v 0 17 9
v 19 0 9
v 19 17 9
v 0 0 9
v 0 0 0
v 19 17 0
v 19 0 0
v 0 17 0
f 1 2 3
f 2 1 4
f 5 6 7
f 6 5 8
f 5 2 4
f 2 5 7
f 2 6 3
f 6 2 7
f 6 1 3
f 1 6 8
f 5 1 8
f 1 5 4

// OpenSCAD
// Generated by SolidPython 1.0.1 on 2020-07-29 00:46:56


cube(size = [19, 17, 9]);
/***********************************************
*********      SolidPython code:      **********
************************************************
 
# import packages: SolidPython
from solid import *
from solid.utils import *
from itertools import chain, combinations, permutations


class Resize:

    def __init__(self, scad_file):
        self.scad_file = scad_file
        #self.scad_file = import_scad(scad_file)
        # cone/cylinder param:
        self.r1 = 0
        self.r2 = 0
        self.h = 0
        # rectangular prism param:
        self.w = 0
        self.l = 0
        # ellipse param:
        self.r = 0

    # import OpenScad code (file name corresponds to shape)


    # classify shape + parameters
    def assign(self, param1, param2, param3):
        if self.scad_file == 'cone.scad':
            self.r1 = param1
            self.r2 = param2
            self.h = param3
        elif self.scad_file == 'cylinder.scad':
            self.r1 = param1
            self.r2 = param2
            self.h = param3
        elif self.scad_file == 'rectangularPrism.scad':
            self.h = param1
            self.l = param2
            self.w = param3
        else:
            self.r = param1
            self.h = param2

    # resize parameters
    def iterate(self):
        x = range(3, 20, 2)
        i = 1
        if self.scad_file == 'cone.scad':
            tempList = list(permutations(x, 2))
            for temp in tempList:
                param1 = temp[0]
                param2 = temp[1]
                filepath = 'produced_scad_files/' + 'cone' + str(param1) + '_' + str(param2) + '_' + '.scad'
                scad_render_to_file(cylinder(h=param1, r1=param2, r2=0), filepath)

        elif self.scad_file == 'cylinder.scad':
            tempList = list(permutations(x, 3))
            for temp in tempList:
                param1 = temp[0]
                param2 = temp[1]
                filepath = 'produced_scad_files/' + 'cylinder' + str(param1) + '_' + str(param2) + '_' + '.scad'
                scad_render_to_file(cylinder(h=param1, r1=param2, r2=param2), filepath)

        elif self.scad_file == 'rectangularPrism.scad':
            tempList = list(permutations(x, 3))
            for temp in tempList:
                param1 = temp[0]
                param2 = temp[1]
                param3 = temp[2]
                filepath = 'produced_scad_files/' + 'rectangularPrism' + str(param1) + '_' + str(param2) + '_' + str(
                    param3) + '.scad'
                scad_render_to_file(cube(size=(param1, param2, param3)), filepath)

        elif self.scad_file == 'ellipse.scad':
            tempList = list(permutations(x, 4))
            for temp in tempList:
                param1 = temp[0]
                param2 = temp[1]
                param3 = temp[2]
                param4 = temp[3]
                filepath = 'produced_scad_files/' + 'ellipse' + str(param1) + '_' + str(param2) + '_' + str(param3) + '_' + str(param4) + '.scad'
                scad_render_to_file(scale([param1, param2, param3])(sphere(r=param4)), filepath)

    def render_to_scadfile(self):
        scad_render_to_file(scad, 'example.scad') 
 
************************************************/
